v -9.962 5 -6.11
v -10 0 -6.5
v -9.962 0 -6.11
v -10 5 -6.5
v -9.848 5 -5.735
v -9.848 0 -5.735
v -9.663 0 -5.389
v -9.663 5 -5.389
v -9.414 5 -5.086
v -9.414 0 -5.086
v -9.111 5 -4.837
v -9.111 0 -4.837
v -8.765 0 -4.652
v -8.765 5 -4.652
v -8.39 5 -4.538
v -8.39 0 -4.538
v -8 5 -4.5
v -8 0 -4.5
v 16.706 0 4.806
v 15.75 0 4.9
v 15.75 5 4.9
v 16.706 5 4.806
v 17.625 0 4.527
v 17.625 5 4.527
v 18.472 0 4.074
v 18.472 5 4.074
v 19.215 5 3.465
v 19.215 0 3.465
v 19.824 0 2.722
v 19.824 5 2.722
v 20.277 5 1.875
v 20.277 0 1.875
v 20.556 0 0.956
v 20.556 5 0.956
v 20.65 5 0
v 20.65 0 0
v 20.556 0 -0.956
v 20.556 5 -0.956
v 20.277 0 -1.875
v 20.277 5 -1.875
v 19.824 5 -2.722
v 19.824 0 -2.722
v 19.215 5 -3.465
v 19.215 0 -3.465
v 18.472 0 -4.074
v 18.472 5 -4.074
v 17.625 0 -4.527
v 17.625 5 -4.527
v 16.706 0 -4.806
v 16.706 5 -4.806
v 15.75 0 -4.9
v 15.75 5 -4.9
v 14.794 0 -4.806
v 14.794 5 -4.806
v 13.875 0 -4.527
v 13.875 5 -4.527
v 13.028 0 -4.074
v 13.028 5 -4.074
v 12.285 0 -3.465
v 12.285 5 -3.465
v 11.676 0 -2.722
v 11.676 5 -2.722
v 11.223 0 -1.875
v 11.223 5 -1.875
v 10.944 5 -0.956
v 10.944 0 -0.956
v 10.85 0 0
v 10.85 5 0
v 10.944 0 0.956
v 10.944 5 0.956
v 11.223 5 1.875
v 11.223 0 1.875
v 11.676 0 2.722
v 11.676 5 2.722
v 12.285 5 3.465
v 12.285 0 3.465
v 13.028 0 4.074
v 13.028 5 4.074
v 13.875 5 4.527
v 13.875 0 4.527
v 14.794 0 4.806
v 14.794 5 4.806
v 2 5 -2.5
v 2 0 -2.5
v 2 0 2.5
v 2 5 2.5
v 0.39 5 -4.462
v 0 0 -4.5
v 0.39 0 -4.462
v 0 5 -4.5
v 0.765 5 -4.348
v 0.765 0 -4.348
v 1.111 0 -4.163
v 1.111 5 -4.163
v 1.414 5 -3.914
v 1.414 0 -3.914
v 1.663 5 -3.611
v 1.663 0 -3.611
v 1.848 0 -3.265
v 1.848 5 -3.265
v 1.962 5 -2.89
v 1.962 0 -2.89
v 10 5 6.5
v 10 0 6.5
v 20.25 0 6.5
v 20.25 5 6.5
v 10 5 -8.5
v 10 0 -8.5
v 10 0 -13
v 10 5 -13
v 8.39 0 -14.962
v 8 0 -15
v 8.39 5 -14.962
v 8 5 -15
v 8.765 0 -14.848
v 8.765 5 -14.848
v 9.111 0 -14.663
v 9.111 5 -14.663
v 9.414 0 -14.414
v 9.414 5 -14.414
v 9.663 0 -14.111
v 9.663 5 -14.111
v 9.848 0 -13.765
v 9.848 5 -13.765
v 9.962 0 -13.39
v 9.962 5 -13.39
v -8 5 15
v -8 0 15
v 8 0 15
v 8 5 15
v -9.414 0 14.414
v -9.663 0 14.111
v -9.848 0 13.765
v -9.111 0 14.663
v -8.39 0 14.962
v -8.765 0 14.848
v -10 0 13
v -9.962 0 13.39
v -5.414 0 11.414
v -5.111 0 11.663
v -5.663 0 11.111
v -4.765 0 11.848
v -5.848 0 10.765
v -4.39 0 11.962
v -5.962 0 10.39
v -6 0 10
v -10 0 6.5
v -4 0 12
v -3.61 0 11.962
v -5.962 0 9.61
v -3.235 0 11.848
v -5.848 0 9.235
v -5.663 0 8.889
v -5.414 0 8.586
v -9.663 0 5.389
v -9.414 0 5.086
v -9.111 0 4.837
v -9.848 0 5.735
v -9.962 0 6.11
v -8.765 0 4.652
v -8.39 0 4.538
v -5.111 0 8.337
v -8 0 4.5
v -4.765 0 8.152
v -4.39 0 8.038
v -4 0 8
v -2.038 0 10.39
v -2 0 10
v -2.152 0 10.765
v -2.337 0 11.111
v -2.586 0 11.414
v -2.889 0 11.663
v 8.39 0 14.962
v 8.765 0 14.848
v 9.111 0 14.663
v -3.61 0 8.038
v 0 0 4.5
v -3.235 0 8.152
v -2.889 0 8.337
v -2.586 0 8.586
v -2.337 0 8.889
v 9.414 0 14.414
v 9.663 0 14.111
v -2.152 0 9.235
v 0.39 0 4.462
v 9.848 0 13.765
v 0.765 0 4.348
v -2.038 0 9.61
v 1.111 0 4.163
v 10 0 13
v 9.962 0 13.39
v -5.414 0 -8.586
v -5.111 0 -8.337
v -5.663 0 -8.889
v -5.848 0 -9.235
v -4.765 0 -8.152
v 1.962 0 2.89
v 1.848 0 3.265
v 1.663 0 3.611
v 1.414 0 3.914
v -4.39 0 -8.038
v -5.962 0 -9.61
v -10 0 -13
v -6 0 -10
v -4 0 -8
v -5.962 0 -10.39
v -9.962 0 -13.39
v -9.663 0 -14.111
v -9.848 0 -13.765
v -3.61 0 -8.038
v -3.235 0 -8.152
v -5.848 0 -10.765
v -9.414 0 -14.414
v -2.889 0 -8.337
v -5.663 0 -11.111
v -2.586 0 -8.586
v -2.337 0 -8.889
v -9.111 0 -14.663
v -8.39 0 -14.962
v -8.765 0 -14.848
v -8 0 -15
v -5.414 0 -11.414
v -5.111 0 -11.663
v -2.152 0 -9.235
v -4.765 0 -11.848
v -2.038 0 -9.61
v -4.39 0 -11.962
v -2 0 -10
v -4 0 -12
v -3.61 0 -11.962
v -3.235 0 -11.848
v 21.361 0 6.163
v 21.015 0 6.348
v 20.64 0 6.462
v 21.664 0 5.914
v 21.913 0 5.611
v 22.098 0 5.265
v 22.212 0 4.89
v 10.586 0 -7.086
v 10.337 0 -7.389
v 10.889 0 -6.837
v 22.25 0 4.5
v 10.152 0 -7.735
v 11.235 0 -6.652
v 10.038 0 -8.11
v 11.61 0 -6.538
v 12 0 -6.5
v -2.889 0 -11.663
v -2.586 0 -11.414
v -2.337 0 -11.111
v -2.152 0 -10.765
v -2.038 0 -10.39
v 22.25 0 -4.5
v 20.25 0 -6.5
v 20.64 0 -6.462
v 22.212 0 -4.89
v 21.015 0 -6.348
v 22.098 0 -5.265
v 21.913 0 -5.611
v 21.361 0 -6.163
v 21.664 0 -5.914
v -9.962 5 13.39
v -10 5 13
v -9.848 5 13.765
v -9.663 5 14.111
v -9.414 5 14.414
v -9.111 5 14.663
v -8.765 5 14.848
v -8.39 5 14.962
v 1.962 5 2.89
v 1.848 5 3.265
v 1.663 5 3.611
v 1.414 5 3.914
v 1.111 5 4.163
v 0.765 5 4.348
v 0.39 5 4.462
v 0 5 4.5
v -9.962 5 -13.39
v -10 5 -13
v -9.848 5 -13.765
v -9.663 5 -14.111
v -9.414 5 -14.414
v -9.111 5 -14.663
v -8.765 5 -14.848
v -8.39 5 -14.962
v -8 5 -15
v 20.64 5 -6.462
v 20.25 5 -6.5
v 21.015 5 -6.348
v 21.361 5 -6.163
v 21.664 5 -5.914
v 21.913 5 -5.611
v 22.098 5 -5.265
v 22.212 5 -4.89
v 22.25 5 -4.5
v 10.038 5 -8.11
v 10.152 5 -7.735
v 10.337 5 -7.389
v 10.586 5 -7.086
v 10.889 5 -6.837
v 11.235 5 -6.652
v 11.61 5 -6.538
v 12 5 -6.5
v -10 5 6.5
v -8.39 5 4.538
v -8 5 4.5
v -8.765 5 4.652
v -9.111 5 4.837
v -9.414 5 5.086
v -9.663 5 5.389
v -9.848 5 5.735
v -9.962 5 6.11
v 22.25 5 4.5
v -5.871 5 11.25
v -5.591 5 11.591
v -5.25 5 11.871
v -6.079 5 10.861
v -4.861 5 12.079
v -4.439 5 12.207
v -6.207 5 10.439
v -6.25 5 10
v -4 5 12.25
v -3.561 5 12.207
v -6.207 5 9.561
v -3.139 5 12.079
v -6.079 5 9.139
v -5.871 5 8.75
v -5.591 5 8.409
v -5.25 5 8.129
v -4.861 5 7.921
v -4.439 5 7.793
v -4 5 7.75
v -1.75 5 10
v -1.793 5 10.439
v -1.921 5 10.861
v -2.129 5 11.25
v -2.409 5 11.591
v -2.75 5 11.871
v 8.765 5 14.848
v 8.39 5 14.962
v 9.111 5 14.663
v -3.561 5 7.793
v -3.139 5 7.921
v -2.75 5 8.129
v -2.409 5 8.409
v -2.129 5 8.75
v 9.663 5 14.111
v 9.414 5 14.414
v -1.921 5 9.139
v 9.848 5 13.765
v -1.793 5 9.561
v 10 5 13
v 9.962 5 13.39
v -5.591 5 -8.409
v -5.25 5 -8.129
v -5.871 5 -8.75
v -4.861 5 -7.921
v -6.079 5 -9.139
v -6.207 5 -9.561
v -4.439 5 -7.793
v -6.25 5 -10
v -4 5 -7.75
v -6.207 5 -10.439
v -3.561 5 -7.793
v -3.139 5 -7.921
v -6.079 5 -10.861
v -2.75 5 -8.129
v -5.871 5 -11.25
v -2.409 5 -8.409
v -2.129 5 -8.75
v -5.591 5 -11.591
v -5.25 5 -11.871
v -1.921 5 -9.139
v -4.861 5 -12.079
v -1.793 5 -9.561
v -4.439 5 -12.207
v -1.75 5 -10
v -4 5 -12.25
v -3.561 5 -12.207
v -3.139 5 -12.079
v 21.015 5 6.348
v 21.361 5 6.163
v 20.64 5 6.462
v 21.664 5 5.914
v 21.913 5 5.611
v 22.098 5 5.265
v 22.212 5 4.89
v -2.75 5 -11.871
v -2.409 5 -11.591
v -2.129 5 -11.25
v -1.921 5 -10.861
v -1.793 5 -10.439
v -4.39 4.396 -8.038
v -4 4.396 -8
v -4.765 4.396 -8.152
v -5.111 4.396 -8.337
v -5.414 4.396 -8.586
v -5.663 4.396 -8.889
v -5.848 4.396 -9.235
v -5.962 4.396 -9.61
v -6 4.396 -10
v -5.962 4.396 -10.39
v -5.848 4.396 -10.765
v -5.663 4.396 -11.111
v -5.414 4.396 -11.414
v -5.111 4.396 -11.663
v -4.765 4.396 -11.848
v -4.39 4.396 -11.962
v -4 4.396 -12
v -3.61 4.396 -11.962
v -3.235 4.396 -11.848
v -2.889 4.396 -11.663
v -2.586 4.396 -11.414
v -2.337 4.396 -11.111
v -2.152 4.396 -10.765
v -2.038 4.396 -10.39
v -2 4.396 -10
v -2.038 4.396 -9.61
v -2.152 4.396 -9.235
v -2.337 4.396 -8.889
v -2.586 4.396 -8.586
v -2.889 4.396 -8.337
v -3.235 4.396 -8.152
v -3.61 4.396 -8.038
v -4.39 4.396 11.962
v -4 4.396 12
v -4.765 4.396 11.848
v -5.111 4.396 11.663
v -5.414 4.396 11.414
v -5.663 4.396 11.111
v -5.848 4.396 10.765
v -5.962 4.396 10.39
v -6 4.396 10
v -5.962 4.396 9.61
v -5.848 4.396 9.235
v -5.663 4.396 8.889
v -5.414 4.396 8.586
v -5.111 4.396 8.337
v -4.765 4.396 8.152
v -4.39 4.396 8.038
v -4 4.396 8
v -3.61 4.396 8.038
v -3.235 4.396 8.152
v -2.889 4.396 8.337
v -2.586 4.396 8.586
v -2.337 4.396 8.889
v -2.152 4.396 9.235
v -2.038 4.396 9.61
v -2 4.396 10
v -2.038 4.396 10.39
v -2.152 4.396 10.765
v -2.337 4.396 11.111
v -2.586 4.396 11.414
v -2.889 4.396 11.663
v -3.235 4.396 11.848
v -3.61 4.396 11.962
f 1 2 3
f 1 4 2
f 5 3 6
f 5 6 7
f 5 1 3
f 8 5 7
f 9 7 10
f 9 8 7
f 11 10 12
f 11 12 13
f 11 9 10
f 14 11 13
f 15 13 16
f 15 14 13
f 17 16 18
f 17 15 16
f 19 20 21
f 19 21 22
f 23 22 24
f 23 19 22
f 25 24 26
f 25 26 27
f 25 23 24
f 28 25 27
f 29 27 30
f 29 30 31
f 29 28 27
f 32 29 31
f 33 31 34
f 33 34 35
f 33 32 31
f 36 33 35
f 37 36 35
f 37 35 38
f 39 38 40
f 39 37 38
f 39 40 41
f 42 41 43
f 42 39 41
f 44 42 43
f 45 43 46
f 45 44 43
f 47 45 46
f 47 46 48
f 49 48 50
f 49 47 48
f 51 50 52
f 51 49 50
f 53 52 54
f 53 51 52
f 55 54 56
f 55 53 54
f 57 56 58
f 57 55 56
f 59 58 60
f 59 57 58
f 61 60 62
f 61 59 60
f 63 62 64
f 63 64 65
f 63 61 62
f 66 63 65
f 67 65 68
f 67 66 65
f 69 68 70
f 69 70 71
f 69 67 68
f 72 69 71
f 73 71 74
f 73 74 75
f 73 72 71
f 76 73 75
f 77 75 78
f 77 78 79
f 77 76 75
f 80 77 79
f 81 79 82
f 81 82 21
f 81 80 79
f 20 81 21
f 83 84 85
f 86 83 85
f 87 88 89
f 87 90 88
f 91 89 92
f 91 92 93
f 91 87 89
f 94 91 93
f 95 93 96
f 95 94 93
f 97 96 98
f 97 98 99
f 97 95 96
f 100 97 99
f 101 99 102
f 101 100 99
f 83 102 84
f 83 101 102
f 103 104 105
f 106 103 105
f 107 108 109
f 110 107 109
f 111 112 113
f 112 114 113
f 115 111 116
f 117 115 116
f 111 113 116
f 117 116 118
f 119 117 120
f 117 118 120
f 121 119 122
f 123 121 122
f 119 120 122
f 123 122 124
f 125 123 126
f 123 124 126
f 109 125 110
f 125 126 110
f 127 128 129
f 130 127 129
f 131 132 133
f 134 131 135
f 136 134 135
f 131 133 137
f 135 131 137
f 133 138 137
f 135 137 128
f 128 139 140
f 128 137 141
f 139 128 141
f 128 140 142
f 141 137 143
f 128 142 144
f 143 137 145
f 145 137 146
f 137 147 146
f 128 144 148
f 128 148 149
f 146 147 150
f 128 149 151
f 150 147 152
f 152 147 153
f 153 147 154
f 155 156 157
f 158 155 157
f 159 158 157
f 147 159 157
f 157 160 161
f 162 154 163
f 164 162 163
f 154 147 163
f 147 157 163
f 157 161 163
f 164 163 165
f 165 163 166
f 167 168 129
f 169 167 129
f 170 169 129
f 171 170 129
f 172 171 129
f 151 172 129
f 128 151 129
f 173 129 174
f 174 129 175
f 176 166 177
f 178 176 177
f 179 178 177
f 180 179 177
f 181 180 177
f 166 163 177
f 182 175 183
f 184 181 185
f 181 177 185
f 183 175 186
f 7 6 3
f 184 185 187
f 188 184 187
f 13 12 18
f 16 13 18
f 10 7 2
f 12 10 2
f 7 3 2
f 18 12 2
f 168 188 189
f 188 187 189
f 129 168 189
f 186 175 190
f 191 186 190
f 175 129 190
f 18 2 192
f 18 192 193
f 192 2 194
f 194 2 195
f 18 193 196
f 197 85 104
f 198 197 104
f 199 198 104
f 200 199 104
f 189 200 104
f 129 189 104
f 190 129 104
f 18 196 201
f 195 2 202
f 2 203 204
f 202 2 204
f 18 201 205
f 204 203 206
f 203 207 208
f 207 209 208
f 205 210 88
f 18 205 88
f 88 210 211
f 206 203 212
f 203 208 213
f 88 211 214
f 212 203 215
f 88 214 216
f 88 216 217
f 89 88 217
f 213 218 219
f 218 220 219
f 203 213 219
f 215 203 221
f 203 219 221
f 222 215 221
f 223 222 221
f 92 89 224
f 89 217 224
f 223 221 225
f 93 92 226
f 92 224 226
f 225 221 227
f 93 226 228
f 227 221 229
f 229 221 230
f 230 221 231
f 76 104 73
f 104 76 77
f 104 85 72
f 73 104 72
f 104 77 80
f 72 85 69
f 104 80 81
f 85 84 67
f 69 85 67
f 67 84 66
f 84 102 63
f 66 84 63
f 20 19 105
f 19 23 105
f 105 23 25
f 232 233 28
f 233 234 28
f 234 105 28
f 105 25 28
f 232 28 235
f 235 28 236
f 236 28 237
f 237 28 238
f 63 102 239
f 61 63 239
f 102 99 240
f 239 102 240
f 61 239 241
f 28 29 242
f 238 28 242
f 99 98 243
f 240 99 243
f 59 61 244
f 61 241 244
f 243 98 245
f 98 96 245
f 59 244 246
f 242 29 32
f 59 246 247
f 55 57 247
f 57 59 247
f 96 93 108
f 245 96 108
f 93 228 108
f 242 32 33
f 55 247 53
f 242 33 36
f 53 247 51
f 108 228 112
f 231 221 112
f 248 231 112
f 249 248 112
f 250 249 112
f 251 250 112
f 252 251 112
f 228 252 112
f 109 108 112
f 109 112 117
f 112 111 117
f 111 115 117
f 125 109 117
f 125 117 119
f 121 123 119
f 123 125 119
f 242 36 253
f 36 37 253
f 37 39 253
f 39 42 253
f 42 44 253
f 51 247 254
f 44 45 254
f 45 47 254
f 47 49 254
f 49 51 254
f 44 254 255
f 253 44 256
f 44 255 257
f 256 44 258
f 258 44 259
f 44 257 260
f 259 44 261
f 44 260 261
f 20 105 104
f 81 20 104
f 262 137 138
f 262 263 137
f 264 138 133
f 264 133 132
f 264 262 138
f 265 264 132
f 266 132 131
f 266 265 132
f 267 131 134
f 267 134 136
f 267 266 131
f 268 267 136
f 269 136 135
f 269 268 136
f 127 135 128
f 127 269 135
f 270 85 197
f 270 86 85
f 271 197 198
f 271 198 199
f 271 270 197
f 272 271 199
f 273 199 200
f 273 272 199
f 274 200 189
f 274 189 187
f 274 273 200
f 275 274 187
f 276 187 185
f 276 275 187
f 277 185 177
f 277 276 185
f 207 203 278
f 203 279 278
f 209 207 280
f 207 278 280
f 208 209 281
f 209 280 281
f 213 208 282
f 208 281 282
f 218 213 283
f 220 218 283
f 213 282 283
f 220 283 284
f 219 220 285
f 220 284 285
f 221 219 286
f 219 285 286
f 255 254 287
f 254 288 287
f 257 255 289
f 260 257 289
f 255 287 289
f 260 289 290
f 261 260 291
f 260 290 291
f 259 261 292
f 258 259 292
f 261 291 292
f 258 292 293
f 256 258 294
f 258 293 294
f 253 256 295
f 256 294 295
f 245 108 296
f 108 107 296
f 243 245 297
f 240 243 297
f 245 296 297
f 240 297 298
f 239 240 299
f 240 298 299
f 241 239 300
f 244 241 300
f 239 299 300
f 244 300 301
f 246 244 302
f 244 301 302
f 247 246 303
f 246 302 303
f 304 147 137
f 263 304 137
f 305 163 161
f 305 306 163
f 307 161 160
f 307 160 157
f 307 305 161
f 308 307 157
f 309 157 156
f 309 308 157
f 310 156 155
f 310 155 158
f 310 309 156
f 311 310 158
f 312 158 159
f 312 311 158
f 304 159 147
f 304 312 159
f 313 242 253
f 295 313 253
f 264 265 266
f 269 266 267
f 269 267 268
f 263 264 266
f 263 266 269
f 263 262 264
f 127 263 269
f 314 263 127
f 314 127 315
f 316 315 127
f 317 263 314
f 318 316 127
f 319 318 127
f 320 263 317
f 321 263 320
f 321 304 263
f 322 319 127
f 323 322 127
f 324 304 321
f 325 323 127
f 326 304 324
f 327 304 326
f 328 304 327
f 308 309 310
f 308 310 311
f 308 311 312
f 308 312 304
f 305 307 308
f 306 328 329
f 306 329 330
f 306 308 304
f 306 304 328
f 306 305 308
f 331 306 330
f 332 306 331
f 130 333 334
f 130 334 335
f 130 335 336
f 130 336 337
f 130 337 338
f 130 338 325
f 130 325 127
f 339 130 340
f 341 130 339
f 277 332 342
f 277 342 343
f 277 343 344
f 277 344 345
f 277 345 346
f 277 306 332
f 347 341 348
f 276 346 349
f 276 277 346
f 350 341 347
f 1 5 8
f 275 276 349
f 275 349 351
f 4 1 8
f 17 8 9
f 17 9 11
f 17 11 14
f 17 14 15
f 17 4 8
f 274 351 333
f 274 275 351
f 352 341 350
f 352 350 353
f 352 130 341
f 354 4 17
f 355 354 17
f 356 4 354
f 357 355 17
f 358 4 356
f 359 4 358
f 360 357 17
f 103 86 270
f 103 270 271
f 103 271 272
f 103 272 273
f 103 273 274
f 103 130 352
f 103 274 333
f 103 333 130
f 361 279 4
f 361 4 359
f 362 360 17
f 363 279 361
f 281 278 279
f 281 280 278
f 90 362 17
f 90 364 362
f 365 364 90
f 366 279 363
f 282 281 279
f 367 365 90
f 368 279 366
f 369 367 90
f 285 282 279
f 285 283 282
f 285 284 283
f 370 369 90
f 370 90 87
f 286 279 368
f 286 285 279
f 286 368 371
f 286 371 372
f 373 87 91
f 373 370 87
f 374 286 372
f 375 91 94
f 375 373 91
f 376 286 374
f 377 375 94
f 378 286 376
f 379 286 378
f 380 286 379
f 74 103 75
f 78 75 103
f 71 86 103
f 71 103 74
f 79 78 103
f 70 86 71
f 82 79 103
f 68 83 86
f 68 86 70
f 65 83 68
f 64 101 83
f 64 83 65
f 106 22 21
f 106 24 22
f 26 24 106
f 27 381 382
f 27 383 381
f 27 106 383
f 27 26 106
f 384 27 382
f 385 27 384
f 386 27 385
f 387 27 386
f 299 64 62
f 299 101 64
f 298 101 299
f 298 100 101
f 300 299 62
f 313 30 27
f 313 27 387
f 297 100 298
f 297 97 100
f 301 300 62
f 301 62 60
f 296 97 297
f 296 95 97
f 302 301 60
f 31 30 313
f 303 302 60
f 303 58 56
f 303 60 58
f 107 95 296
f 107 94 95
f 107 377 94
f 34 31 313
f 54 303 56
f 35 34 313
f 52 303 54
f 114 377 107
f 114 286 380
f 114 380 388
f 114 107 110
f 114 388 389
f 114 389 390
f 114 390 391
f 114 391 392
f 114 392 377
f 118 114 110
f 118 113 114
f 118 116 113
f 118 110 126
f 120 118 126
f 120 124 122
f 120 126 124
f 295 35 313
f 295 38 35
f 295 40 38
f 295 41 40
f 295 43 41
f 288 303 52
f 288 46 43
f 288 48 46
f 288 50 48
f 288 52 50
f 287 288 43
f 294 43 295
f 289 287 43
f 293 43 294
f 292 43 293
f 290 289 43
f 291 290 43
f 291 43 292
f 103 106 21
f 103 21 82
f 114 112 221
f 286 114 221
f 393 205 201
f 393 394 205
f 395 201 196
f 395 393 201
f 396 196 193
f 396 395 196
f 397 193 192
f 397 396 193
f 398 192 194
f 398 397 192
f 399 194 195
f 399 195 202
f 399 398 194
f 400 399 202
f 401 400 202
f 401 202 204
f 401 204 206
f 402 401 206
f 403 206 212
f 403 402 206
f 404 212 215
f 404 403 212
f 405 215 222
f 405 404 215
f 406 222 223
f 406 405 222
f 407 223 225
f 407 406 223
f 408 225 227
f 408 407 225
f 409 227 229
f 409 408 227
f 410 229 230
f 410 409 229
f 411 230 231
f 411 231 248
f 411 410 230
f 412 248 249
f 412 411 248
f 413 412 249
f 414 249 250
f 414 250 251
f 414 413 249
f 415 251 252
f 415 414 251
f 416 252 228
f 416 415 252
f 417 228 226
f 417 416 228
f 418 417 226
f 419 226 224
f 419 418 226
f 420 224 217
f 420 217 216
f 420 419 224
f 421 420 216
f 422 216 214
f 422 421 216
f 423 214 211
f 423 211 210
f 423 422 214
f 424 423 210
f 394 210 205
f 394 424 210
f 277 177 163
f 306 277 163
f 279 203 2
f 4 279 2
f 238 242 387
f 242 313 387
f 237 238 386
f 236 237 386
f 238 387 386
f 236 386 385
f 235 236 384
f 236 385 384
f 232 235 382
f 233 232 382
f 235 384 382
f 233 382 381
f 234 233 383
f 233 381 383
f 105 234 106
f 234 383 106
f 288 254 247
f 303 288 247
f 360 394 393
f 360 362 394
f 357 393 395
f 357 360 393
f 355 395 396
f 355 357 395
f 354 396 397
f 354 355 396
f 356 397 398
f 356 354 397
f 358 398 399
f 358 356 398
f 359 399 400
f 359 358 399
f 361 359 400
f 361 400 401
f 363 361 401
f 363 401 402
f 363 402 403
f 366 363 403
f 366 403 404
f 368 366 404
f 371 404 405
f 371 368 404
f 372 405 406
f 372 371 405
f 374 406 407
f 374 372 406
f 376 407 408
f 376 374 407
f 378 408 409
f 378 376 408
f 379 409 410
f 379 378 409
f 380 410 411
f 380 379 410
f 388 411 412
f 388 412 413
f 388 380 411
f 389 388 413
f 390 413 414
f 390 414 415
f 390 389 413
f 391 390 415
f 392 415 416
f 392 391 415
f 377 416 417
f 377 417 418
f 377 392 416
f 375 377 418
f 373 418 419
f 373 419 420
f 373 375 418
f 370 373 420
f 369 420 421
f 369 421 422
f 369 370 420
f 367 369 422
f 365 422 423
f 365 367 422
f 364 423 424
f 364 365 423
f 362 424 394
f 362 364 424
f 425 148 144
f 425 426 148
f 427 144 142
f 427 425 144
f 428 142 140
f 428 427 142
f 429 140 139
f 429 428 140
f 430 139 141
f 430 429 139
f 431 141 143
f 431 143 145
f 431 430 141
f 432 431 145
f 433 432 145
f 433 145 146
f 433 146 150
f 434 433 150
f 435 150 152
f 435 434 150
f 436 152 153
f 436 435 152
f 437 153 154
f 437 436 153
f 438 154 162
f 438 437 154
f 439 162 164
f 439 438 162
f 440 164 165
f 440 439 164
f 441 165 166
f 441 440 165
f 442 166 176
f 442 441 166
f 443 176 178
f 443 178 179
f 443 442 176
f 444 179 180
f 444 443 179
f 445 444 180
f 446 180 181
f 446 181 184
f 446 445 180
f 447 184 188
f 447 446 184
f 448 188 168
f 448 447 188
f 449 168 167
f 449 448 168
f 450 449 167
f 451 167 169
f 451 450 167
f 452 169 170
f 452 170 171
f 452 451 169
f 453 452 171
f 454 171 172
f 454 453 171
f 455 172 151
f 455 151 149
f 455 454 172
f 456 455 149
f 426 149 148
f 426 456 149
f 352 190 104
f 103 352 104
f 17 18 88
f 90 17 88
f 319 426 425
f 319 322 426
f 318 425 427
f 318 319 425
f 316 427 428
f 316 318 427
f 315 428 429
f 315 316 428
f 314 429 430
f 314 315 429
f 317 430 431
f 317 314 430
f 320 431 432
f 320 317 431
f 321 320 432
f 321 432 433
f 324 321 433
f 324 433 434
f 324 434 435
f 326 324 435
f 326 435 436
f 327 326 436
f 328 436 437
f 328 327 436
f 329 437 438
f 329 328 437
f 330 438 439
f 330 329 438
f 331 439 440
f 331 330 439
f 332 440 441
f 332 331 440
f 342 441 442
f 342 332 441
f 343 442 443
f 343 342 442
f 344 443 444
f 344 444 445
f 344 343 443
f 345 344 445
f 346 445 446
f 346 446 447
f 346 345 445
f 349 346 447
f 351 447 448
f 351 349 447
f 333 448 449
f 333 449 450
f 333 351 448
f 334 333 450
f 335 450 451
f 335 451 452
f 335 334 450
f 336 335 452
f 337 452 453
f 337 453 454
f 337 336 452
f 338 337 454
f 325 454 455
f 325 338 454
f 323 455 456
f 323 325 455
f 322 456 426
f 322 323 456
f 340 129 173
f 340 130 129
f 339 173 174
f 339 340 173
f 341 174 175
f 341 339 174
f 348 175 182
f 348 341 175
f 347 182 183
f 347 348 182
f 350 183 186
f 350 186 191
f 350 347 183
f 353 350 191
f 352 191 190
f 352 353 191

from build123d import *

# Parameters (mm, degrees)
SKETCH1_R                         = 4.9
BOSS_EXTRUDE1_DEPTH               = 5
FILLET1_R                         = 2
F_4_0_4_DIAMETER_HOLE1_AT_2_COUNT = 2
F_4_0_4_DIAMETER_HOLE1_AT_2_PITCH = 10
F_4_0_4_DIAMETER_HOLE1_AT_3_COUNT = 2
F_4_0_4_DIAMETER_HOLE1_AT_3_PITCH = 10


with BuildPart() as part:
    # Sketch1 → Boss-Extrude1 (new body)
    with BuildSketch(Plane(origin=(0, 0, 0), x_dir=(1, 0, 0), z_dir=(0, 1, 0))):
        Polygon((-10, 15), (-10, 4.5), (2, 4.5), (2, -4.5), (-10, -4.5), (-10, -15), (10, -15), (10, -6.5), (22.25, -6.5), (22.25, 6.5), (10, 6.5), (10, 15), align=None)
        with Locations(Location((15.75, 0, 0), (0, 0, 270))):
            Circle(SKETCH1_R, mode=Mode.SUBTRACT)
    extrude(amount=BOSS_EXTRUDE1_DEPTH)

    # Fillet1
    fillet1_edges = [part.edges().sort_by_distance(p)[0] for p in [
        (10, 2.5, 15),
        (-10, 2.5, 15),
        (-10, 2.5, 4.5),
        (2, 2.5, 4.5),
        (2, 2.5, -4.5),
        (-10, 2.5, -4.5),
        (-10, 2.5, -15),
        (10, 2.5, -15),
        (10, 2.5, -6.5),
        (22.25, 2.5, -6.5),
        (22.25, 2.5, 6.5),
    ]]
    fillet(fillet1_edges, radius=FILLET1_R)

    # Sketch5 → Ø4.0 (4) Diameter Hole1 (revolve, cut)
    with BuildSketch(Plane(origin=(-4, 5, 0), x_dir=(0, 0, 1), z_dir=(1, 0, 0))):
        Polygon((0, 0), (0, 5), (2, 5), (2, 0.603553391), (2.25, 0), align=None)
    f_4_0_4_diameter_hole1 = revolve(axis=Axis((-4, 11.35, 0), (0, -1, 0)), mode=Mode.SUBTRACT)

    # Ø4.0 (4) Diameter Hole1 at 2: Ø4.0 (4) Diameter Hole1 ×2
    with Locations(*[(0, 0, i * F_4_0_4_DIAMETER_HOLE1_AT_2_PITCH) for i in range(1, F_4_0_4_DIAMETER_HOLE1_AT_2_COUNT)]):
        add(f_4_0_4_diameter_hole1, mode=Mode.SUBTRACT)

    # Ø4.0 (4) Diameter Hole1 at 3: Ø4.0 (4) Diameter Hole1 ×2
    with Locations(*[(0, 0, -i * F_4_0_4_DIAMETER_HOLE1_AT_3_PITCH) for i in range(1, F_4_0_4_DIAMETER_HOLE1_AT_3_COUNT)]):
        add(f_4_0_4_diameter_hole1, mode=Mode.SUBTRACT)


solid = part.part
